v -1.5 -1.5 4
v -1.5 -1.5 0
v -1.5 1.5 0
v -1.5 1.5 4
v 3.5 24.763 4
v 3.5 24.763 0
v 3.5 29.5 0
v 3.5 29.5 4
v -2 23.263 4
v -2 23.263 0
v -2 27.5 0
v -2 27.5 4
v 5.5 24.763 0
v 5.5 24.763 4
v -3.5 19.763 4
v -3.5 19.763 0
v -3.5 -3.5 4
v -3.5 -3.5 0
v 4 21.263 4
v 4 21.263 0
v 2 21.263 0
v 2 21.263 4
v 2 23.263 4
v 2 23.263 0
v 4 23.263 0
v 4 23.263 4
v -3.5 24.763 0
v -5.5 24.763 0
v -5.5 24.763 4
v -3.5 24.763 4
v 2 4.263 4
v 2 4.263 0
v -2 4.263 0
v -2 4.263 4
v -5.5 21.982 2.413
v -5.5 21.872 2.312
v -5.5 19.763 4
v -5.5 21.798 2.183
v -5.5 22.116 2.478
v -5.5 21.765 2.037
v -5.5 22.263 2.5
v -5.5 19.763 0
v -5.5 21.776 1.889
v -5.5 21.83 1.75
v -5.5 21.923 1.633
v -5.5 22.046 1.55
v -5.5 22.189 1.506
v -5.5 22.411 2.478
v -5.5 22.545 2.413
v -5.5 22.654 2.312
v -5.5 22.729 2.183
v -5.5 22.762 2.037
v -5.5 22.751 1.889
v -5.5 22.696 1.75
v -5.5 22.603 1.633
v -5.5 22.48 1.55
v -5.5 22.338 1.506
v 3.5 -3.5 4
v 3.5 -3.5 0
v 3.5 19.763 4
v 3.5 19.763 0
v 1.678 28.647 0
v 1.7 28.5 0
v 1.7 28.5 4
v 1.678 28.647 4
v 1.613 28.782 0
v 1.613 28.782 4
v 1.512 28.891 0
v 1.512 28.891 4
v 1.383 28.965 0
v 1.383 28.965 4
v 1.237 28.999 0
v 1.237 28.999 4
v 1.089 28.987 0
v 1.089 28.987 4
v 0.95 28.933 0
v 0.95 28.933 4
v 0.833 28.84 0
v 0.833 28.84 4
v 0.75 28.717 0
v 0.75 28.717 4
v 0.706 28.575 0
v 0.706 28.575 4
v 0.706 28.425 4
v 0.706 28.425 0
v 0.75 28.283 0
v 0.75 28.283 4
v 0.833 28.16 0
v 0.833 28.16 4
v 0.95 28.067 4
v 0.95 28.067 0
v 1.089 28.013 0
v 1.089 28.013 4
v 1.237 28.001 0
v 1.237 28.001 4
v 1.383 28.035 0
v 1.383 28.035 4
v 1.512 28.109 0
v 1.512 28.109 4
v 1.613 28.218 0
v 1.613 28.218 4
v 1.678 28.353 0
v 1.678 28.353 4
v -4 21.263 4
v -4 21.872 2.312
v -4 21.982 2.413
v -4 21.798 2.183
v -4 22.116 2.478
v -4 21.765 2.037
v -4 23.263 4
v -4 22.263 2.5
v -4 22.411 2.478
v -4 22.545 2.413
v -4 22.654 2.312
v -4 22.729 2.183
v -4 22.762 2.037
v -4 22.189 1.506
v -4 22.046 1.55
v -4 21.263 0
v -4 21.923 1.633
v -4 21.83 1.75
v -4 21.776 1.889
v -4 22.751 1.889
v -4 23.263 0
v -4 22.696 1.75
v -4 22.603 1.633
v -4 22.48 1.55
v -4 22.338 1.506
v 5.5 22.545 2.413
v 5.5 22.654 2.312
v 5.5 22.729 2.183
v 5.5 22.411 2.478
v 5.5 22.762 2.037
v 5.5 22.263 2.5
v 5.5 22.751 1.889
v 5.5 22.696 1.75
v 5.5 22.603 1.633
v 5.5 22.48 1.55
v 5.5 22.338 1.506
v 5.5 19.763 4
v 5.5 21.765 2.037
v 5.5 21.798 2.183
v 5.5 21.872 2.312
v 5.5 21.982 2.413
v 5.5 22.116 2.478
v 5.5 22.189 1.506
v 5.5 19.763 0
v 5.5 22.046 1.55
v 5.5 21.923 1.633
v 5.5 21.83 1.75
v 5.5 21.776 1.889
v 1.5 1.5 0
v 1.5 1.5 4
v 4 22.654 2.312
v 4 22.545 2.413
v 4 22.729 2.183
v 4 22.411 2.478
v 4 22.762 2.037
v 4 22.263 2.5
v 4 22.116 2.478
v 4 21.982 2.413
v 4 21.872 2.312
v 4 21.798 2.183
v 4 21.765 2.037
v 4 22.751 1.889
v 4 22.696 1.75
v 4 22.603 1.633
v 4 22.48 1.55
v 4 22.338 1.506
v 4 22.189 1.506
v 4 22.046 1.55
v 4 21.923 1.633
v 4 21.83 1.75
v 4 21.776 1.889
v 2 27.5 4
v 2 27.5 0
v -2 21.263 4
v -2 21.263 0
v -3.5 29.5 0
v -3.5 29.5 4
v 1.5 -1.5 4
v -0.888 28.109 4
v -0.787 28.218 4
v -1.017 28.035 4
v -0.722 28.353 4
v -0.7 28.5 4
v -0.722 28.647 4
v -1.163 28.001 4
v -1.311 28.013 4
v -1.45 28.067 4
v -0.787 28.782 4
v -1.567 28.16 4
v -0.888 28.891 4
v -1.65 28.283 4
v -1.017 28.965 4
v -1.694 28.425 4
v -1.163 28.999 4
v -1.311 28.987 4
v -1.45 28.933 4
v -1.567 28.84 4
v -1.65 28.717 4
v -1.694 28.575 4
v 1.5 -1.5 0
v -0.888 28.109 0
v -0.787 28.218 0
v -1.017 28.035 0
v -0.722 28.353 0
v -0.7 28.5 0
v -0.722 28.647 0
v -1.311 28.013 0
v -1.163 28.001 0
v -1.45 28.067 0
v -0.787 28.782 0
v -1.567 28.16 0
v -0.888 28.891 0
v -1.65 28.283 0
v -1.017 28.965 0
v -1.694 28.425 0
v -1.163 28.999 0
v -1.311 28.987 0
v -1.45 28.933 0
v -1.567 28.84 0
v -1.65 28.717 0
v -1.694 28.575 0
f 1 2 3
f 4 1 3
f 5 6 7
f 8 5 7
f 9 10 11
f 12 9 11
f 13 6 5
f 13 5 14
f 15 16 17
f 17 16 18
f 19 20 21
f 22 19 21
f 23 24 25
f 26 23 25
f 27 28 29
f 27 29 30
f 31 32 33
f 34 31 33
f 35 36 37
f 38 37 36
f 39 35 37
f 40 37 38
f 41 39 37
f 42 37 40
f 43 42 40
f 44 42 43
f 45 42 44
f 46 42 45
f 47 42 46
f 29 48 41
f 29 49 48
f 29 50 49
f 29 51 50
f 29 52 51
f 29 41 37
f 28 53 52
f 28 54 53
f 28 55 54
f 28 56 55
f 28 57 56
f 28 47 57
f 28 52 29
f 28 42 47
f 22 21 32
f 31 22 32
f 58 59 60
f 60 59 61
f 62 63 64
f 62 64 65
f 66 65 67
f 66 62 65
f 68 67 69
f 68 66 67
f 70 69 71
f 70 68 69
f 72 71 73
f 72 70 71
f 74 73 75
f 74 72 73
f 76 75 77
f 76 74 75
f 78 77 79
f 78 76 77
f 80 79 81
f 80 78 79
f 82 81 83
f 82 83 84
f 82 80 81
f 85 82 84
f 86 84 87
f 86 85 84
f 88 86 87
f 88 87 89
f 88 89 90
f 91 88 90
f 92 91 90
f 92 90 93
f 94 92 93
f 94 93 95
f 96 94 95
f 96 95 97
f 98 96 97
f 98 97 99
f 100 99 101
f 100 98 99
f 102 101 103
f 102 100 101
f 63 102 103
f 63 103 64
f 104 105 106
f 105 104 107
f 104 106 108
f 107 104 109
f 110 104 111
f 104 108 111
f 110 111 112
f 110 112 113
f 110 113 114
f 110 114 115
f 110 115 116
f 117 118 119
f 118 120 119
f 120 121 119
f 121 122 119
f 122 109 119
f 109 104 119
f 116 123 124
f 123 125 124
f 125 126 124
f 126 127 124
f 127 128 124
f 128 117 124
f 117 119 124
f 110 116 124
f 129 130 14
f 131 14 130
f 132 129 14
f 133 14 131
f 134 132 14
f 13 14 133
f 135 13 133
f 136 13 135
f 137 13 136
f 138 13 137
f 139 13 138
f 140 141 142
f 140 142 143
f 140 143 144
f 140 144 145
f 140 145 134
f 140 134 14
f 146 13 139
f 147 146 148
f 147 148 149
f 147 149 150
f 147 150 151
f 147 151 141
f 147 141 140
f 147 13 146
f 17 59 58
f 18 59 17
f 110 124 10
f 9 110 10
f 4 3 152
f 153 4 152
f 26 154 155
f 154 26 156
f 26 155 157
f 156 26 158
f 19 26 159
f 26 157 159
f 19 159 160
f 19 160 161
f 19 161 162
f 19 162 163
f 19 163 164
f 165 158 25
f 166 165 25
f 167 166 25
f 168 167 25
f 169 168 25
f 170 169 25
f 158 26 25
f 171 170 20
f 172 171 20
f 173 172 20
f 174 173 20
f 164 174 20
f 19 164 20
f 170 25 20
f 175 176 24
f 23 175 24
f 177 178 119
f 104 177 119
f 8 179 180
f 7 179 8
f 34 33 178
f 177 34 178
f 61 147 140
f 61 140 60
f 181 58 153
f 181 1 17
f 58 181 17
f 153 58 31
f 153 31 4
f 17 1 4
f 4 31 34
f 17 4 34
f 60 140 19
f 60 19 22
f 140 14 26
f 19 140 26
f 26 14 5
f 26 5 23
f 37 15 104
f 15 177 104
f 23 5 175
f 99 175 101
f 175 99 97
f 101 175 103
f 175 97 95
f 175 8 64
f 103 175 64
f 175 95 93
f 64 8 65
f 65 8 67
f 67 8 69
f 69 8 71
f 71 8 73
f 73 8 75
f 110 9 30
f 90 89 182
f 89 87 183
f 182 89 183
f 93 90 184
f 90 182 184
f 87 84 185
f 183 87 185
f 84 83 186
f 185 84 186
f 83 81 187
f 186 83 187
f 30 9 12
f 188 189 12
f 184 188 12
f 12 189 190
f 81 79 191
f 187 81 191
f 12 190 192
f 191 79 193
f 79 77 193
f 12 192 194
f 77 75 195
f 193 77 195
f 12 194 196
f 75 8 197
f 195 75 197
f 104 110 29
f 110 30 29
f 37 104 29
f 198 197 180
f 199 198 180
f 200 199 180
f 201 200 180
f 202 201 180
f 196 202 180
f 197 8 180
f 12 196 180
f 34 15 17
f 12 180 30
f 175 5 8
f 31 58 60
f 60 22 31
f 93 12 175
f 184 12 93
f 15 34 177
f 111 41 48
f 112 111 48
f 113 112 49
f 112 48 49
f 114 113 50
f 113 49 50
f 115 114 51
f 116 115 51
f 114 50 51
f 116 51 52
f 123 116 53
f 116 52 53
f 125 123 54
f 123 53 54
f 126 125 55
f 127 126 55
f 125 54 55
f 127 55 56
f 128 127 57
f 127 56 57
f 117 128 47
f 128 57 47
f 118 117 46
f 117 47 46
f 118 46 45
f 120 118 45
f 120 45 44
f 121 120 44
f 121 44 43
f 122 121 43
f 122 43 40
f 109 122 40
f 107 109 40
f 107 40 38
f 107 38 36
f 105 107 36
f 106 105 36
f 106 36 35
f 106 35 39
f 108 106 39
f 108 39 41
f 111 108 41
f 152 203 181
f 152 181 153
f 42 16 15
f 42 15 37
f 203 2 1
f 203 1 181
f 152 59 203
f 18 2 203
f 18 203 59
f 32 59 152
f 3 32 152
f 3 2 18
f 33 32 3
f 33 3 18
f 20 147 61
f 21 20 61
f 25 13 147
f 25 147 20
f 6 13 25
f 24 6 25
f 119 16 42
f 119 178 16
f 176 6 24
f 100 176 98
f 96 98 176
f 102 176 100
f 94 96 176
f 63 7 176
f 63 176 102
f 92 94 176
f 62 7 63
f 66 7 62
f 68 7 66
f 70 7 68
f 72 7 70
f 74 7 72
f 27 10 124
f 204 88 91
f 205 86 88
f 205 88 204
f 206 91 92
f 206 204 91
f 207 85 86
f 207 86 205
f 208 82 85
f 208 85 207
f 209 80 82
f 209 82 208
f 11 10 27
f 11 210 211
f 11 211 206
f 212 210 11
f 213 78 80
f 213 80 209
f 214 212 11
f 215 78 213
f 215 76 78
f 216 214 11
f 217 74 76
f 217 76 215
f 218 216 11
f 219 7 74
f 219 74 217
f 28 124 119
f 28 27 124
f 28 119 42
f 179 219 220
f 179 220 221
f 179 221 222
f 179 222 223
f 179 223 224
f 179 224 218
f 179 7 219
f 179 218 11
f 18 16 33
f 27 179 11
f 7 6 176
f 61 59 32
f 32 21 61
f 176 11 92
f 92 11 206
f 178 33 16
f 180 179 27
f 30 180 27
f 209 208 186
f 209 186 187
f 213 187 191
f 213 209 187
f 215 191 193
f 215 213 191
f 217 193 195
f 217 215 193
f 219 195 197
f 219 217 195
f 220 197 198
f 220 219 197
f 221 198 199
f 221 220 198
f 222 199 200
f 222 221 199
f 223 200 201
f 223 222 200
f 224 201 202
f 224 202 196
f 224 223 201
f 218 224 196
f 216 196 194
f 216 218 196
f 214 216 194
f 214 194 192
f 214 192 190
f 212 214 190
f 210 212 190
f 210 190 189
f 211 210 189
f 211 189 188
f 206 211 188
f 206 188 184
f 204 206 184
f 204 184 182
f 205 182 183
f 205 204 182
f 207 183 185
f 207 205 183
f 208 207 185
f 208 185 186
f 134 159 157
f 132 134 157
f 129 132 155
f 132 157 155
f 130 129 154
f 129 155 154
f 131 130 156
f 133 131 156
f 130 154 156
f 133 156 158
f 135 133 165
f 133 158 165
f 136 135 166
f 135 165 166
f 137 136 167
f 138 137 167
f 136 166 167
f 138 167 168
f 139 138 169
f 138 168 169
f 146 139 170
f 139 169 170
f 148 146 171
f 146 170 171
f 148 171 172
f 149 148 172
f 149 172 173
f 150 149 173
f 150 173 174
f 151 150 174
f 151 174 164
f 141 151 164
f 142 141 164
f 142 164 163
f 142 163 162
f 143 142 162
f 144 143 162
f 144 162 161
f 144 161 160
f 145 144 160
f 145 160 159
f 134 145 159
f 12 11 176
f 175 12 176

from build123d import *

# Parameters (mm, degrees)
SKETCH1_R           = 0.5
SKETCH1_W           = 3
SKETCH1_H           = 3
BOSS_EXTRUDE1_DEPTH = 4
SKETCH_1_R          = 0.5
CUT_EXTRUDE_1_DEPTH = 12


with BuildPart() as part:
    # Sketch1 → Boss-Extrude1 (new body)
    with BuildSketch(Plane.XY):
        Polygon((3.5, -3.5), (-3.5, -3.5), (-3.5, 3.5), (-3.5, 19.763228949), (-5.5, 19.763228949), (-5.5, 24.763228949), (-3.5, 24.763228949), (-3.5, 27.5), (-3.5, 29.5), (3.5, 29.5), (3.5, 27.5), (3.5, 24.763228949), (5.5, 24.763228949), (5.5, 19.763228949), (3.5, 19.763228949), (3.5, 3.5), align=None)
        with Locations((-1.2, 28.5)):
            Circle(SKETCH1_R, mode=Mode.SUBTRACT)
        with Locations((1.2, 28.5)):
            Circle(SKETCH1_R, mode=Mode.SUBTRACT)
        Polygon((2, 4.263228949), (-2, 4.263228949), (-2, 21.263228949), (-4, 21.263228949), (-4, 23.263228949), (-2, 23.263228949), (-2, 27.5), (2, 27.5), (2, 23.263228949), (4, 23.263228949), (4, 21.263228949), (2, 21.263228949), align=None, mode=Mode.SUBTRACT)
        Rectangle(SKETCH1_W, SKETCH1_H, mode=Mode.SUBTRACT)
    extrude(amount=BOSS_EXTRUDE1_DEPTH)

    # 草图1 → 切除-拉伸1 (cut, through all)
    with BuildSketch(Plane.ZY.offset(5.5)):
        with Locations((2, 22.263228949)):
            Circle(SKETCH_1_R)
    extrude(amount=-CUT_EXTRUDE_1_DEPTH, mode=Mode.SUBTRACT)


solid = part.part
